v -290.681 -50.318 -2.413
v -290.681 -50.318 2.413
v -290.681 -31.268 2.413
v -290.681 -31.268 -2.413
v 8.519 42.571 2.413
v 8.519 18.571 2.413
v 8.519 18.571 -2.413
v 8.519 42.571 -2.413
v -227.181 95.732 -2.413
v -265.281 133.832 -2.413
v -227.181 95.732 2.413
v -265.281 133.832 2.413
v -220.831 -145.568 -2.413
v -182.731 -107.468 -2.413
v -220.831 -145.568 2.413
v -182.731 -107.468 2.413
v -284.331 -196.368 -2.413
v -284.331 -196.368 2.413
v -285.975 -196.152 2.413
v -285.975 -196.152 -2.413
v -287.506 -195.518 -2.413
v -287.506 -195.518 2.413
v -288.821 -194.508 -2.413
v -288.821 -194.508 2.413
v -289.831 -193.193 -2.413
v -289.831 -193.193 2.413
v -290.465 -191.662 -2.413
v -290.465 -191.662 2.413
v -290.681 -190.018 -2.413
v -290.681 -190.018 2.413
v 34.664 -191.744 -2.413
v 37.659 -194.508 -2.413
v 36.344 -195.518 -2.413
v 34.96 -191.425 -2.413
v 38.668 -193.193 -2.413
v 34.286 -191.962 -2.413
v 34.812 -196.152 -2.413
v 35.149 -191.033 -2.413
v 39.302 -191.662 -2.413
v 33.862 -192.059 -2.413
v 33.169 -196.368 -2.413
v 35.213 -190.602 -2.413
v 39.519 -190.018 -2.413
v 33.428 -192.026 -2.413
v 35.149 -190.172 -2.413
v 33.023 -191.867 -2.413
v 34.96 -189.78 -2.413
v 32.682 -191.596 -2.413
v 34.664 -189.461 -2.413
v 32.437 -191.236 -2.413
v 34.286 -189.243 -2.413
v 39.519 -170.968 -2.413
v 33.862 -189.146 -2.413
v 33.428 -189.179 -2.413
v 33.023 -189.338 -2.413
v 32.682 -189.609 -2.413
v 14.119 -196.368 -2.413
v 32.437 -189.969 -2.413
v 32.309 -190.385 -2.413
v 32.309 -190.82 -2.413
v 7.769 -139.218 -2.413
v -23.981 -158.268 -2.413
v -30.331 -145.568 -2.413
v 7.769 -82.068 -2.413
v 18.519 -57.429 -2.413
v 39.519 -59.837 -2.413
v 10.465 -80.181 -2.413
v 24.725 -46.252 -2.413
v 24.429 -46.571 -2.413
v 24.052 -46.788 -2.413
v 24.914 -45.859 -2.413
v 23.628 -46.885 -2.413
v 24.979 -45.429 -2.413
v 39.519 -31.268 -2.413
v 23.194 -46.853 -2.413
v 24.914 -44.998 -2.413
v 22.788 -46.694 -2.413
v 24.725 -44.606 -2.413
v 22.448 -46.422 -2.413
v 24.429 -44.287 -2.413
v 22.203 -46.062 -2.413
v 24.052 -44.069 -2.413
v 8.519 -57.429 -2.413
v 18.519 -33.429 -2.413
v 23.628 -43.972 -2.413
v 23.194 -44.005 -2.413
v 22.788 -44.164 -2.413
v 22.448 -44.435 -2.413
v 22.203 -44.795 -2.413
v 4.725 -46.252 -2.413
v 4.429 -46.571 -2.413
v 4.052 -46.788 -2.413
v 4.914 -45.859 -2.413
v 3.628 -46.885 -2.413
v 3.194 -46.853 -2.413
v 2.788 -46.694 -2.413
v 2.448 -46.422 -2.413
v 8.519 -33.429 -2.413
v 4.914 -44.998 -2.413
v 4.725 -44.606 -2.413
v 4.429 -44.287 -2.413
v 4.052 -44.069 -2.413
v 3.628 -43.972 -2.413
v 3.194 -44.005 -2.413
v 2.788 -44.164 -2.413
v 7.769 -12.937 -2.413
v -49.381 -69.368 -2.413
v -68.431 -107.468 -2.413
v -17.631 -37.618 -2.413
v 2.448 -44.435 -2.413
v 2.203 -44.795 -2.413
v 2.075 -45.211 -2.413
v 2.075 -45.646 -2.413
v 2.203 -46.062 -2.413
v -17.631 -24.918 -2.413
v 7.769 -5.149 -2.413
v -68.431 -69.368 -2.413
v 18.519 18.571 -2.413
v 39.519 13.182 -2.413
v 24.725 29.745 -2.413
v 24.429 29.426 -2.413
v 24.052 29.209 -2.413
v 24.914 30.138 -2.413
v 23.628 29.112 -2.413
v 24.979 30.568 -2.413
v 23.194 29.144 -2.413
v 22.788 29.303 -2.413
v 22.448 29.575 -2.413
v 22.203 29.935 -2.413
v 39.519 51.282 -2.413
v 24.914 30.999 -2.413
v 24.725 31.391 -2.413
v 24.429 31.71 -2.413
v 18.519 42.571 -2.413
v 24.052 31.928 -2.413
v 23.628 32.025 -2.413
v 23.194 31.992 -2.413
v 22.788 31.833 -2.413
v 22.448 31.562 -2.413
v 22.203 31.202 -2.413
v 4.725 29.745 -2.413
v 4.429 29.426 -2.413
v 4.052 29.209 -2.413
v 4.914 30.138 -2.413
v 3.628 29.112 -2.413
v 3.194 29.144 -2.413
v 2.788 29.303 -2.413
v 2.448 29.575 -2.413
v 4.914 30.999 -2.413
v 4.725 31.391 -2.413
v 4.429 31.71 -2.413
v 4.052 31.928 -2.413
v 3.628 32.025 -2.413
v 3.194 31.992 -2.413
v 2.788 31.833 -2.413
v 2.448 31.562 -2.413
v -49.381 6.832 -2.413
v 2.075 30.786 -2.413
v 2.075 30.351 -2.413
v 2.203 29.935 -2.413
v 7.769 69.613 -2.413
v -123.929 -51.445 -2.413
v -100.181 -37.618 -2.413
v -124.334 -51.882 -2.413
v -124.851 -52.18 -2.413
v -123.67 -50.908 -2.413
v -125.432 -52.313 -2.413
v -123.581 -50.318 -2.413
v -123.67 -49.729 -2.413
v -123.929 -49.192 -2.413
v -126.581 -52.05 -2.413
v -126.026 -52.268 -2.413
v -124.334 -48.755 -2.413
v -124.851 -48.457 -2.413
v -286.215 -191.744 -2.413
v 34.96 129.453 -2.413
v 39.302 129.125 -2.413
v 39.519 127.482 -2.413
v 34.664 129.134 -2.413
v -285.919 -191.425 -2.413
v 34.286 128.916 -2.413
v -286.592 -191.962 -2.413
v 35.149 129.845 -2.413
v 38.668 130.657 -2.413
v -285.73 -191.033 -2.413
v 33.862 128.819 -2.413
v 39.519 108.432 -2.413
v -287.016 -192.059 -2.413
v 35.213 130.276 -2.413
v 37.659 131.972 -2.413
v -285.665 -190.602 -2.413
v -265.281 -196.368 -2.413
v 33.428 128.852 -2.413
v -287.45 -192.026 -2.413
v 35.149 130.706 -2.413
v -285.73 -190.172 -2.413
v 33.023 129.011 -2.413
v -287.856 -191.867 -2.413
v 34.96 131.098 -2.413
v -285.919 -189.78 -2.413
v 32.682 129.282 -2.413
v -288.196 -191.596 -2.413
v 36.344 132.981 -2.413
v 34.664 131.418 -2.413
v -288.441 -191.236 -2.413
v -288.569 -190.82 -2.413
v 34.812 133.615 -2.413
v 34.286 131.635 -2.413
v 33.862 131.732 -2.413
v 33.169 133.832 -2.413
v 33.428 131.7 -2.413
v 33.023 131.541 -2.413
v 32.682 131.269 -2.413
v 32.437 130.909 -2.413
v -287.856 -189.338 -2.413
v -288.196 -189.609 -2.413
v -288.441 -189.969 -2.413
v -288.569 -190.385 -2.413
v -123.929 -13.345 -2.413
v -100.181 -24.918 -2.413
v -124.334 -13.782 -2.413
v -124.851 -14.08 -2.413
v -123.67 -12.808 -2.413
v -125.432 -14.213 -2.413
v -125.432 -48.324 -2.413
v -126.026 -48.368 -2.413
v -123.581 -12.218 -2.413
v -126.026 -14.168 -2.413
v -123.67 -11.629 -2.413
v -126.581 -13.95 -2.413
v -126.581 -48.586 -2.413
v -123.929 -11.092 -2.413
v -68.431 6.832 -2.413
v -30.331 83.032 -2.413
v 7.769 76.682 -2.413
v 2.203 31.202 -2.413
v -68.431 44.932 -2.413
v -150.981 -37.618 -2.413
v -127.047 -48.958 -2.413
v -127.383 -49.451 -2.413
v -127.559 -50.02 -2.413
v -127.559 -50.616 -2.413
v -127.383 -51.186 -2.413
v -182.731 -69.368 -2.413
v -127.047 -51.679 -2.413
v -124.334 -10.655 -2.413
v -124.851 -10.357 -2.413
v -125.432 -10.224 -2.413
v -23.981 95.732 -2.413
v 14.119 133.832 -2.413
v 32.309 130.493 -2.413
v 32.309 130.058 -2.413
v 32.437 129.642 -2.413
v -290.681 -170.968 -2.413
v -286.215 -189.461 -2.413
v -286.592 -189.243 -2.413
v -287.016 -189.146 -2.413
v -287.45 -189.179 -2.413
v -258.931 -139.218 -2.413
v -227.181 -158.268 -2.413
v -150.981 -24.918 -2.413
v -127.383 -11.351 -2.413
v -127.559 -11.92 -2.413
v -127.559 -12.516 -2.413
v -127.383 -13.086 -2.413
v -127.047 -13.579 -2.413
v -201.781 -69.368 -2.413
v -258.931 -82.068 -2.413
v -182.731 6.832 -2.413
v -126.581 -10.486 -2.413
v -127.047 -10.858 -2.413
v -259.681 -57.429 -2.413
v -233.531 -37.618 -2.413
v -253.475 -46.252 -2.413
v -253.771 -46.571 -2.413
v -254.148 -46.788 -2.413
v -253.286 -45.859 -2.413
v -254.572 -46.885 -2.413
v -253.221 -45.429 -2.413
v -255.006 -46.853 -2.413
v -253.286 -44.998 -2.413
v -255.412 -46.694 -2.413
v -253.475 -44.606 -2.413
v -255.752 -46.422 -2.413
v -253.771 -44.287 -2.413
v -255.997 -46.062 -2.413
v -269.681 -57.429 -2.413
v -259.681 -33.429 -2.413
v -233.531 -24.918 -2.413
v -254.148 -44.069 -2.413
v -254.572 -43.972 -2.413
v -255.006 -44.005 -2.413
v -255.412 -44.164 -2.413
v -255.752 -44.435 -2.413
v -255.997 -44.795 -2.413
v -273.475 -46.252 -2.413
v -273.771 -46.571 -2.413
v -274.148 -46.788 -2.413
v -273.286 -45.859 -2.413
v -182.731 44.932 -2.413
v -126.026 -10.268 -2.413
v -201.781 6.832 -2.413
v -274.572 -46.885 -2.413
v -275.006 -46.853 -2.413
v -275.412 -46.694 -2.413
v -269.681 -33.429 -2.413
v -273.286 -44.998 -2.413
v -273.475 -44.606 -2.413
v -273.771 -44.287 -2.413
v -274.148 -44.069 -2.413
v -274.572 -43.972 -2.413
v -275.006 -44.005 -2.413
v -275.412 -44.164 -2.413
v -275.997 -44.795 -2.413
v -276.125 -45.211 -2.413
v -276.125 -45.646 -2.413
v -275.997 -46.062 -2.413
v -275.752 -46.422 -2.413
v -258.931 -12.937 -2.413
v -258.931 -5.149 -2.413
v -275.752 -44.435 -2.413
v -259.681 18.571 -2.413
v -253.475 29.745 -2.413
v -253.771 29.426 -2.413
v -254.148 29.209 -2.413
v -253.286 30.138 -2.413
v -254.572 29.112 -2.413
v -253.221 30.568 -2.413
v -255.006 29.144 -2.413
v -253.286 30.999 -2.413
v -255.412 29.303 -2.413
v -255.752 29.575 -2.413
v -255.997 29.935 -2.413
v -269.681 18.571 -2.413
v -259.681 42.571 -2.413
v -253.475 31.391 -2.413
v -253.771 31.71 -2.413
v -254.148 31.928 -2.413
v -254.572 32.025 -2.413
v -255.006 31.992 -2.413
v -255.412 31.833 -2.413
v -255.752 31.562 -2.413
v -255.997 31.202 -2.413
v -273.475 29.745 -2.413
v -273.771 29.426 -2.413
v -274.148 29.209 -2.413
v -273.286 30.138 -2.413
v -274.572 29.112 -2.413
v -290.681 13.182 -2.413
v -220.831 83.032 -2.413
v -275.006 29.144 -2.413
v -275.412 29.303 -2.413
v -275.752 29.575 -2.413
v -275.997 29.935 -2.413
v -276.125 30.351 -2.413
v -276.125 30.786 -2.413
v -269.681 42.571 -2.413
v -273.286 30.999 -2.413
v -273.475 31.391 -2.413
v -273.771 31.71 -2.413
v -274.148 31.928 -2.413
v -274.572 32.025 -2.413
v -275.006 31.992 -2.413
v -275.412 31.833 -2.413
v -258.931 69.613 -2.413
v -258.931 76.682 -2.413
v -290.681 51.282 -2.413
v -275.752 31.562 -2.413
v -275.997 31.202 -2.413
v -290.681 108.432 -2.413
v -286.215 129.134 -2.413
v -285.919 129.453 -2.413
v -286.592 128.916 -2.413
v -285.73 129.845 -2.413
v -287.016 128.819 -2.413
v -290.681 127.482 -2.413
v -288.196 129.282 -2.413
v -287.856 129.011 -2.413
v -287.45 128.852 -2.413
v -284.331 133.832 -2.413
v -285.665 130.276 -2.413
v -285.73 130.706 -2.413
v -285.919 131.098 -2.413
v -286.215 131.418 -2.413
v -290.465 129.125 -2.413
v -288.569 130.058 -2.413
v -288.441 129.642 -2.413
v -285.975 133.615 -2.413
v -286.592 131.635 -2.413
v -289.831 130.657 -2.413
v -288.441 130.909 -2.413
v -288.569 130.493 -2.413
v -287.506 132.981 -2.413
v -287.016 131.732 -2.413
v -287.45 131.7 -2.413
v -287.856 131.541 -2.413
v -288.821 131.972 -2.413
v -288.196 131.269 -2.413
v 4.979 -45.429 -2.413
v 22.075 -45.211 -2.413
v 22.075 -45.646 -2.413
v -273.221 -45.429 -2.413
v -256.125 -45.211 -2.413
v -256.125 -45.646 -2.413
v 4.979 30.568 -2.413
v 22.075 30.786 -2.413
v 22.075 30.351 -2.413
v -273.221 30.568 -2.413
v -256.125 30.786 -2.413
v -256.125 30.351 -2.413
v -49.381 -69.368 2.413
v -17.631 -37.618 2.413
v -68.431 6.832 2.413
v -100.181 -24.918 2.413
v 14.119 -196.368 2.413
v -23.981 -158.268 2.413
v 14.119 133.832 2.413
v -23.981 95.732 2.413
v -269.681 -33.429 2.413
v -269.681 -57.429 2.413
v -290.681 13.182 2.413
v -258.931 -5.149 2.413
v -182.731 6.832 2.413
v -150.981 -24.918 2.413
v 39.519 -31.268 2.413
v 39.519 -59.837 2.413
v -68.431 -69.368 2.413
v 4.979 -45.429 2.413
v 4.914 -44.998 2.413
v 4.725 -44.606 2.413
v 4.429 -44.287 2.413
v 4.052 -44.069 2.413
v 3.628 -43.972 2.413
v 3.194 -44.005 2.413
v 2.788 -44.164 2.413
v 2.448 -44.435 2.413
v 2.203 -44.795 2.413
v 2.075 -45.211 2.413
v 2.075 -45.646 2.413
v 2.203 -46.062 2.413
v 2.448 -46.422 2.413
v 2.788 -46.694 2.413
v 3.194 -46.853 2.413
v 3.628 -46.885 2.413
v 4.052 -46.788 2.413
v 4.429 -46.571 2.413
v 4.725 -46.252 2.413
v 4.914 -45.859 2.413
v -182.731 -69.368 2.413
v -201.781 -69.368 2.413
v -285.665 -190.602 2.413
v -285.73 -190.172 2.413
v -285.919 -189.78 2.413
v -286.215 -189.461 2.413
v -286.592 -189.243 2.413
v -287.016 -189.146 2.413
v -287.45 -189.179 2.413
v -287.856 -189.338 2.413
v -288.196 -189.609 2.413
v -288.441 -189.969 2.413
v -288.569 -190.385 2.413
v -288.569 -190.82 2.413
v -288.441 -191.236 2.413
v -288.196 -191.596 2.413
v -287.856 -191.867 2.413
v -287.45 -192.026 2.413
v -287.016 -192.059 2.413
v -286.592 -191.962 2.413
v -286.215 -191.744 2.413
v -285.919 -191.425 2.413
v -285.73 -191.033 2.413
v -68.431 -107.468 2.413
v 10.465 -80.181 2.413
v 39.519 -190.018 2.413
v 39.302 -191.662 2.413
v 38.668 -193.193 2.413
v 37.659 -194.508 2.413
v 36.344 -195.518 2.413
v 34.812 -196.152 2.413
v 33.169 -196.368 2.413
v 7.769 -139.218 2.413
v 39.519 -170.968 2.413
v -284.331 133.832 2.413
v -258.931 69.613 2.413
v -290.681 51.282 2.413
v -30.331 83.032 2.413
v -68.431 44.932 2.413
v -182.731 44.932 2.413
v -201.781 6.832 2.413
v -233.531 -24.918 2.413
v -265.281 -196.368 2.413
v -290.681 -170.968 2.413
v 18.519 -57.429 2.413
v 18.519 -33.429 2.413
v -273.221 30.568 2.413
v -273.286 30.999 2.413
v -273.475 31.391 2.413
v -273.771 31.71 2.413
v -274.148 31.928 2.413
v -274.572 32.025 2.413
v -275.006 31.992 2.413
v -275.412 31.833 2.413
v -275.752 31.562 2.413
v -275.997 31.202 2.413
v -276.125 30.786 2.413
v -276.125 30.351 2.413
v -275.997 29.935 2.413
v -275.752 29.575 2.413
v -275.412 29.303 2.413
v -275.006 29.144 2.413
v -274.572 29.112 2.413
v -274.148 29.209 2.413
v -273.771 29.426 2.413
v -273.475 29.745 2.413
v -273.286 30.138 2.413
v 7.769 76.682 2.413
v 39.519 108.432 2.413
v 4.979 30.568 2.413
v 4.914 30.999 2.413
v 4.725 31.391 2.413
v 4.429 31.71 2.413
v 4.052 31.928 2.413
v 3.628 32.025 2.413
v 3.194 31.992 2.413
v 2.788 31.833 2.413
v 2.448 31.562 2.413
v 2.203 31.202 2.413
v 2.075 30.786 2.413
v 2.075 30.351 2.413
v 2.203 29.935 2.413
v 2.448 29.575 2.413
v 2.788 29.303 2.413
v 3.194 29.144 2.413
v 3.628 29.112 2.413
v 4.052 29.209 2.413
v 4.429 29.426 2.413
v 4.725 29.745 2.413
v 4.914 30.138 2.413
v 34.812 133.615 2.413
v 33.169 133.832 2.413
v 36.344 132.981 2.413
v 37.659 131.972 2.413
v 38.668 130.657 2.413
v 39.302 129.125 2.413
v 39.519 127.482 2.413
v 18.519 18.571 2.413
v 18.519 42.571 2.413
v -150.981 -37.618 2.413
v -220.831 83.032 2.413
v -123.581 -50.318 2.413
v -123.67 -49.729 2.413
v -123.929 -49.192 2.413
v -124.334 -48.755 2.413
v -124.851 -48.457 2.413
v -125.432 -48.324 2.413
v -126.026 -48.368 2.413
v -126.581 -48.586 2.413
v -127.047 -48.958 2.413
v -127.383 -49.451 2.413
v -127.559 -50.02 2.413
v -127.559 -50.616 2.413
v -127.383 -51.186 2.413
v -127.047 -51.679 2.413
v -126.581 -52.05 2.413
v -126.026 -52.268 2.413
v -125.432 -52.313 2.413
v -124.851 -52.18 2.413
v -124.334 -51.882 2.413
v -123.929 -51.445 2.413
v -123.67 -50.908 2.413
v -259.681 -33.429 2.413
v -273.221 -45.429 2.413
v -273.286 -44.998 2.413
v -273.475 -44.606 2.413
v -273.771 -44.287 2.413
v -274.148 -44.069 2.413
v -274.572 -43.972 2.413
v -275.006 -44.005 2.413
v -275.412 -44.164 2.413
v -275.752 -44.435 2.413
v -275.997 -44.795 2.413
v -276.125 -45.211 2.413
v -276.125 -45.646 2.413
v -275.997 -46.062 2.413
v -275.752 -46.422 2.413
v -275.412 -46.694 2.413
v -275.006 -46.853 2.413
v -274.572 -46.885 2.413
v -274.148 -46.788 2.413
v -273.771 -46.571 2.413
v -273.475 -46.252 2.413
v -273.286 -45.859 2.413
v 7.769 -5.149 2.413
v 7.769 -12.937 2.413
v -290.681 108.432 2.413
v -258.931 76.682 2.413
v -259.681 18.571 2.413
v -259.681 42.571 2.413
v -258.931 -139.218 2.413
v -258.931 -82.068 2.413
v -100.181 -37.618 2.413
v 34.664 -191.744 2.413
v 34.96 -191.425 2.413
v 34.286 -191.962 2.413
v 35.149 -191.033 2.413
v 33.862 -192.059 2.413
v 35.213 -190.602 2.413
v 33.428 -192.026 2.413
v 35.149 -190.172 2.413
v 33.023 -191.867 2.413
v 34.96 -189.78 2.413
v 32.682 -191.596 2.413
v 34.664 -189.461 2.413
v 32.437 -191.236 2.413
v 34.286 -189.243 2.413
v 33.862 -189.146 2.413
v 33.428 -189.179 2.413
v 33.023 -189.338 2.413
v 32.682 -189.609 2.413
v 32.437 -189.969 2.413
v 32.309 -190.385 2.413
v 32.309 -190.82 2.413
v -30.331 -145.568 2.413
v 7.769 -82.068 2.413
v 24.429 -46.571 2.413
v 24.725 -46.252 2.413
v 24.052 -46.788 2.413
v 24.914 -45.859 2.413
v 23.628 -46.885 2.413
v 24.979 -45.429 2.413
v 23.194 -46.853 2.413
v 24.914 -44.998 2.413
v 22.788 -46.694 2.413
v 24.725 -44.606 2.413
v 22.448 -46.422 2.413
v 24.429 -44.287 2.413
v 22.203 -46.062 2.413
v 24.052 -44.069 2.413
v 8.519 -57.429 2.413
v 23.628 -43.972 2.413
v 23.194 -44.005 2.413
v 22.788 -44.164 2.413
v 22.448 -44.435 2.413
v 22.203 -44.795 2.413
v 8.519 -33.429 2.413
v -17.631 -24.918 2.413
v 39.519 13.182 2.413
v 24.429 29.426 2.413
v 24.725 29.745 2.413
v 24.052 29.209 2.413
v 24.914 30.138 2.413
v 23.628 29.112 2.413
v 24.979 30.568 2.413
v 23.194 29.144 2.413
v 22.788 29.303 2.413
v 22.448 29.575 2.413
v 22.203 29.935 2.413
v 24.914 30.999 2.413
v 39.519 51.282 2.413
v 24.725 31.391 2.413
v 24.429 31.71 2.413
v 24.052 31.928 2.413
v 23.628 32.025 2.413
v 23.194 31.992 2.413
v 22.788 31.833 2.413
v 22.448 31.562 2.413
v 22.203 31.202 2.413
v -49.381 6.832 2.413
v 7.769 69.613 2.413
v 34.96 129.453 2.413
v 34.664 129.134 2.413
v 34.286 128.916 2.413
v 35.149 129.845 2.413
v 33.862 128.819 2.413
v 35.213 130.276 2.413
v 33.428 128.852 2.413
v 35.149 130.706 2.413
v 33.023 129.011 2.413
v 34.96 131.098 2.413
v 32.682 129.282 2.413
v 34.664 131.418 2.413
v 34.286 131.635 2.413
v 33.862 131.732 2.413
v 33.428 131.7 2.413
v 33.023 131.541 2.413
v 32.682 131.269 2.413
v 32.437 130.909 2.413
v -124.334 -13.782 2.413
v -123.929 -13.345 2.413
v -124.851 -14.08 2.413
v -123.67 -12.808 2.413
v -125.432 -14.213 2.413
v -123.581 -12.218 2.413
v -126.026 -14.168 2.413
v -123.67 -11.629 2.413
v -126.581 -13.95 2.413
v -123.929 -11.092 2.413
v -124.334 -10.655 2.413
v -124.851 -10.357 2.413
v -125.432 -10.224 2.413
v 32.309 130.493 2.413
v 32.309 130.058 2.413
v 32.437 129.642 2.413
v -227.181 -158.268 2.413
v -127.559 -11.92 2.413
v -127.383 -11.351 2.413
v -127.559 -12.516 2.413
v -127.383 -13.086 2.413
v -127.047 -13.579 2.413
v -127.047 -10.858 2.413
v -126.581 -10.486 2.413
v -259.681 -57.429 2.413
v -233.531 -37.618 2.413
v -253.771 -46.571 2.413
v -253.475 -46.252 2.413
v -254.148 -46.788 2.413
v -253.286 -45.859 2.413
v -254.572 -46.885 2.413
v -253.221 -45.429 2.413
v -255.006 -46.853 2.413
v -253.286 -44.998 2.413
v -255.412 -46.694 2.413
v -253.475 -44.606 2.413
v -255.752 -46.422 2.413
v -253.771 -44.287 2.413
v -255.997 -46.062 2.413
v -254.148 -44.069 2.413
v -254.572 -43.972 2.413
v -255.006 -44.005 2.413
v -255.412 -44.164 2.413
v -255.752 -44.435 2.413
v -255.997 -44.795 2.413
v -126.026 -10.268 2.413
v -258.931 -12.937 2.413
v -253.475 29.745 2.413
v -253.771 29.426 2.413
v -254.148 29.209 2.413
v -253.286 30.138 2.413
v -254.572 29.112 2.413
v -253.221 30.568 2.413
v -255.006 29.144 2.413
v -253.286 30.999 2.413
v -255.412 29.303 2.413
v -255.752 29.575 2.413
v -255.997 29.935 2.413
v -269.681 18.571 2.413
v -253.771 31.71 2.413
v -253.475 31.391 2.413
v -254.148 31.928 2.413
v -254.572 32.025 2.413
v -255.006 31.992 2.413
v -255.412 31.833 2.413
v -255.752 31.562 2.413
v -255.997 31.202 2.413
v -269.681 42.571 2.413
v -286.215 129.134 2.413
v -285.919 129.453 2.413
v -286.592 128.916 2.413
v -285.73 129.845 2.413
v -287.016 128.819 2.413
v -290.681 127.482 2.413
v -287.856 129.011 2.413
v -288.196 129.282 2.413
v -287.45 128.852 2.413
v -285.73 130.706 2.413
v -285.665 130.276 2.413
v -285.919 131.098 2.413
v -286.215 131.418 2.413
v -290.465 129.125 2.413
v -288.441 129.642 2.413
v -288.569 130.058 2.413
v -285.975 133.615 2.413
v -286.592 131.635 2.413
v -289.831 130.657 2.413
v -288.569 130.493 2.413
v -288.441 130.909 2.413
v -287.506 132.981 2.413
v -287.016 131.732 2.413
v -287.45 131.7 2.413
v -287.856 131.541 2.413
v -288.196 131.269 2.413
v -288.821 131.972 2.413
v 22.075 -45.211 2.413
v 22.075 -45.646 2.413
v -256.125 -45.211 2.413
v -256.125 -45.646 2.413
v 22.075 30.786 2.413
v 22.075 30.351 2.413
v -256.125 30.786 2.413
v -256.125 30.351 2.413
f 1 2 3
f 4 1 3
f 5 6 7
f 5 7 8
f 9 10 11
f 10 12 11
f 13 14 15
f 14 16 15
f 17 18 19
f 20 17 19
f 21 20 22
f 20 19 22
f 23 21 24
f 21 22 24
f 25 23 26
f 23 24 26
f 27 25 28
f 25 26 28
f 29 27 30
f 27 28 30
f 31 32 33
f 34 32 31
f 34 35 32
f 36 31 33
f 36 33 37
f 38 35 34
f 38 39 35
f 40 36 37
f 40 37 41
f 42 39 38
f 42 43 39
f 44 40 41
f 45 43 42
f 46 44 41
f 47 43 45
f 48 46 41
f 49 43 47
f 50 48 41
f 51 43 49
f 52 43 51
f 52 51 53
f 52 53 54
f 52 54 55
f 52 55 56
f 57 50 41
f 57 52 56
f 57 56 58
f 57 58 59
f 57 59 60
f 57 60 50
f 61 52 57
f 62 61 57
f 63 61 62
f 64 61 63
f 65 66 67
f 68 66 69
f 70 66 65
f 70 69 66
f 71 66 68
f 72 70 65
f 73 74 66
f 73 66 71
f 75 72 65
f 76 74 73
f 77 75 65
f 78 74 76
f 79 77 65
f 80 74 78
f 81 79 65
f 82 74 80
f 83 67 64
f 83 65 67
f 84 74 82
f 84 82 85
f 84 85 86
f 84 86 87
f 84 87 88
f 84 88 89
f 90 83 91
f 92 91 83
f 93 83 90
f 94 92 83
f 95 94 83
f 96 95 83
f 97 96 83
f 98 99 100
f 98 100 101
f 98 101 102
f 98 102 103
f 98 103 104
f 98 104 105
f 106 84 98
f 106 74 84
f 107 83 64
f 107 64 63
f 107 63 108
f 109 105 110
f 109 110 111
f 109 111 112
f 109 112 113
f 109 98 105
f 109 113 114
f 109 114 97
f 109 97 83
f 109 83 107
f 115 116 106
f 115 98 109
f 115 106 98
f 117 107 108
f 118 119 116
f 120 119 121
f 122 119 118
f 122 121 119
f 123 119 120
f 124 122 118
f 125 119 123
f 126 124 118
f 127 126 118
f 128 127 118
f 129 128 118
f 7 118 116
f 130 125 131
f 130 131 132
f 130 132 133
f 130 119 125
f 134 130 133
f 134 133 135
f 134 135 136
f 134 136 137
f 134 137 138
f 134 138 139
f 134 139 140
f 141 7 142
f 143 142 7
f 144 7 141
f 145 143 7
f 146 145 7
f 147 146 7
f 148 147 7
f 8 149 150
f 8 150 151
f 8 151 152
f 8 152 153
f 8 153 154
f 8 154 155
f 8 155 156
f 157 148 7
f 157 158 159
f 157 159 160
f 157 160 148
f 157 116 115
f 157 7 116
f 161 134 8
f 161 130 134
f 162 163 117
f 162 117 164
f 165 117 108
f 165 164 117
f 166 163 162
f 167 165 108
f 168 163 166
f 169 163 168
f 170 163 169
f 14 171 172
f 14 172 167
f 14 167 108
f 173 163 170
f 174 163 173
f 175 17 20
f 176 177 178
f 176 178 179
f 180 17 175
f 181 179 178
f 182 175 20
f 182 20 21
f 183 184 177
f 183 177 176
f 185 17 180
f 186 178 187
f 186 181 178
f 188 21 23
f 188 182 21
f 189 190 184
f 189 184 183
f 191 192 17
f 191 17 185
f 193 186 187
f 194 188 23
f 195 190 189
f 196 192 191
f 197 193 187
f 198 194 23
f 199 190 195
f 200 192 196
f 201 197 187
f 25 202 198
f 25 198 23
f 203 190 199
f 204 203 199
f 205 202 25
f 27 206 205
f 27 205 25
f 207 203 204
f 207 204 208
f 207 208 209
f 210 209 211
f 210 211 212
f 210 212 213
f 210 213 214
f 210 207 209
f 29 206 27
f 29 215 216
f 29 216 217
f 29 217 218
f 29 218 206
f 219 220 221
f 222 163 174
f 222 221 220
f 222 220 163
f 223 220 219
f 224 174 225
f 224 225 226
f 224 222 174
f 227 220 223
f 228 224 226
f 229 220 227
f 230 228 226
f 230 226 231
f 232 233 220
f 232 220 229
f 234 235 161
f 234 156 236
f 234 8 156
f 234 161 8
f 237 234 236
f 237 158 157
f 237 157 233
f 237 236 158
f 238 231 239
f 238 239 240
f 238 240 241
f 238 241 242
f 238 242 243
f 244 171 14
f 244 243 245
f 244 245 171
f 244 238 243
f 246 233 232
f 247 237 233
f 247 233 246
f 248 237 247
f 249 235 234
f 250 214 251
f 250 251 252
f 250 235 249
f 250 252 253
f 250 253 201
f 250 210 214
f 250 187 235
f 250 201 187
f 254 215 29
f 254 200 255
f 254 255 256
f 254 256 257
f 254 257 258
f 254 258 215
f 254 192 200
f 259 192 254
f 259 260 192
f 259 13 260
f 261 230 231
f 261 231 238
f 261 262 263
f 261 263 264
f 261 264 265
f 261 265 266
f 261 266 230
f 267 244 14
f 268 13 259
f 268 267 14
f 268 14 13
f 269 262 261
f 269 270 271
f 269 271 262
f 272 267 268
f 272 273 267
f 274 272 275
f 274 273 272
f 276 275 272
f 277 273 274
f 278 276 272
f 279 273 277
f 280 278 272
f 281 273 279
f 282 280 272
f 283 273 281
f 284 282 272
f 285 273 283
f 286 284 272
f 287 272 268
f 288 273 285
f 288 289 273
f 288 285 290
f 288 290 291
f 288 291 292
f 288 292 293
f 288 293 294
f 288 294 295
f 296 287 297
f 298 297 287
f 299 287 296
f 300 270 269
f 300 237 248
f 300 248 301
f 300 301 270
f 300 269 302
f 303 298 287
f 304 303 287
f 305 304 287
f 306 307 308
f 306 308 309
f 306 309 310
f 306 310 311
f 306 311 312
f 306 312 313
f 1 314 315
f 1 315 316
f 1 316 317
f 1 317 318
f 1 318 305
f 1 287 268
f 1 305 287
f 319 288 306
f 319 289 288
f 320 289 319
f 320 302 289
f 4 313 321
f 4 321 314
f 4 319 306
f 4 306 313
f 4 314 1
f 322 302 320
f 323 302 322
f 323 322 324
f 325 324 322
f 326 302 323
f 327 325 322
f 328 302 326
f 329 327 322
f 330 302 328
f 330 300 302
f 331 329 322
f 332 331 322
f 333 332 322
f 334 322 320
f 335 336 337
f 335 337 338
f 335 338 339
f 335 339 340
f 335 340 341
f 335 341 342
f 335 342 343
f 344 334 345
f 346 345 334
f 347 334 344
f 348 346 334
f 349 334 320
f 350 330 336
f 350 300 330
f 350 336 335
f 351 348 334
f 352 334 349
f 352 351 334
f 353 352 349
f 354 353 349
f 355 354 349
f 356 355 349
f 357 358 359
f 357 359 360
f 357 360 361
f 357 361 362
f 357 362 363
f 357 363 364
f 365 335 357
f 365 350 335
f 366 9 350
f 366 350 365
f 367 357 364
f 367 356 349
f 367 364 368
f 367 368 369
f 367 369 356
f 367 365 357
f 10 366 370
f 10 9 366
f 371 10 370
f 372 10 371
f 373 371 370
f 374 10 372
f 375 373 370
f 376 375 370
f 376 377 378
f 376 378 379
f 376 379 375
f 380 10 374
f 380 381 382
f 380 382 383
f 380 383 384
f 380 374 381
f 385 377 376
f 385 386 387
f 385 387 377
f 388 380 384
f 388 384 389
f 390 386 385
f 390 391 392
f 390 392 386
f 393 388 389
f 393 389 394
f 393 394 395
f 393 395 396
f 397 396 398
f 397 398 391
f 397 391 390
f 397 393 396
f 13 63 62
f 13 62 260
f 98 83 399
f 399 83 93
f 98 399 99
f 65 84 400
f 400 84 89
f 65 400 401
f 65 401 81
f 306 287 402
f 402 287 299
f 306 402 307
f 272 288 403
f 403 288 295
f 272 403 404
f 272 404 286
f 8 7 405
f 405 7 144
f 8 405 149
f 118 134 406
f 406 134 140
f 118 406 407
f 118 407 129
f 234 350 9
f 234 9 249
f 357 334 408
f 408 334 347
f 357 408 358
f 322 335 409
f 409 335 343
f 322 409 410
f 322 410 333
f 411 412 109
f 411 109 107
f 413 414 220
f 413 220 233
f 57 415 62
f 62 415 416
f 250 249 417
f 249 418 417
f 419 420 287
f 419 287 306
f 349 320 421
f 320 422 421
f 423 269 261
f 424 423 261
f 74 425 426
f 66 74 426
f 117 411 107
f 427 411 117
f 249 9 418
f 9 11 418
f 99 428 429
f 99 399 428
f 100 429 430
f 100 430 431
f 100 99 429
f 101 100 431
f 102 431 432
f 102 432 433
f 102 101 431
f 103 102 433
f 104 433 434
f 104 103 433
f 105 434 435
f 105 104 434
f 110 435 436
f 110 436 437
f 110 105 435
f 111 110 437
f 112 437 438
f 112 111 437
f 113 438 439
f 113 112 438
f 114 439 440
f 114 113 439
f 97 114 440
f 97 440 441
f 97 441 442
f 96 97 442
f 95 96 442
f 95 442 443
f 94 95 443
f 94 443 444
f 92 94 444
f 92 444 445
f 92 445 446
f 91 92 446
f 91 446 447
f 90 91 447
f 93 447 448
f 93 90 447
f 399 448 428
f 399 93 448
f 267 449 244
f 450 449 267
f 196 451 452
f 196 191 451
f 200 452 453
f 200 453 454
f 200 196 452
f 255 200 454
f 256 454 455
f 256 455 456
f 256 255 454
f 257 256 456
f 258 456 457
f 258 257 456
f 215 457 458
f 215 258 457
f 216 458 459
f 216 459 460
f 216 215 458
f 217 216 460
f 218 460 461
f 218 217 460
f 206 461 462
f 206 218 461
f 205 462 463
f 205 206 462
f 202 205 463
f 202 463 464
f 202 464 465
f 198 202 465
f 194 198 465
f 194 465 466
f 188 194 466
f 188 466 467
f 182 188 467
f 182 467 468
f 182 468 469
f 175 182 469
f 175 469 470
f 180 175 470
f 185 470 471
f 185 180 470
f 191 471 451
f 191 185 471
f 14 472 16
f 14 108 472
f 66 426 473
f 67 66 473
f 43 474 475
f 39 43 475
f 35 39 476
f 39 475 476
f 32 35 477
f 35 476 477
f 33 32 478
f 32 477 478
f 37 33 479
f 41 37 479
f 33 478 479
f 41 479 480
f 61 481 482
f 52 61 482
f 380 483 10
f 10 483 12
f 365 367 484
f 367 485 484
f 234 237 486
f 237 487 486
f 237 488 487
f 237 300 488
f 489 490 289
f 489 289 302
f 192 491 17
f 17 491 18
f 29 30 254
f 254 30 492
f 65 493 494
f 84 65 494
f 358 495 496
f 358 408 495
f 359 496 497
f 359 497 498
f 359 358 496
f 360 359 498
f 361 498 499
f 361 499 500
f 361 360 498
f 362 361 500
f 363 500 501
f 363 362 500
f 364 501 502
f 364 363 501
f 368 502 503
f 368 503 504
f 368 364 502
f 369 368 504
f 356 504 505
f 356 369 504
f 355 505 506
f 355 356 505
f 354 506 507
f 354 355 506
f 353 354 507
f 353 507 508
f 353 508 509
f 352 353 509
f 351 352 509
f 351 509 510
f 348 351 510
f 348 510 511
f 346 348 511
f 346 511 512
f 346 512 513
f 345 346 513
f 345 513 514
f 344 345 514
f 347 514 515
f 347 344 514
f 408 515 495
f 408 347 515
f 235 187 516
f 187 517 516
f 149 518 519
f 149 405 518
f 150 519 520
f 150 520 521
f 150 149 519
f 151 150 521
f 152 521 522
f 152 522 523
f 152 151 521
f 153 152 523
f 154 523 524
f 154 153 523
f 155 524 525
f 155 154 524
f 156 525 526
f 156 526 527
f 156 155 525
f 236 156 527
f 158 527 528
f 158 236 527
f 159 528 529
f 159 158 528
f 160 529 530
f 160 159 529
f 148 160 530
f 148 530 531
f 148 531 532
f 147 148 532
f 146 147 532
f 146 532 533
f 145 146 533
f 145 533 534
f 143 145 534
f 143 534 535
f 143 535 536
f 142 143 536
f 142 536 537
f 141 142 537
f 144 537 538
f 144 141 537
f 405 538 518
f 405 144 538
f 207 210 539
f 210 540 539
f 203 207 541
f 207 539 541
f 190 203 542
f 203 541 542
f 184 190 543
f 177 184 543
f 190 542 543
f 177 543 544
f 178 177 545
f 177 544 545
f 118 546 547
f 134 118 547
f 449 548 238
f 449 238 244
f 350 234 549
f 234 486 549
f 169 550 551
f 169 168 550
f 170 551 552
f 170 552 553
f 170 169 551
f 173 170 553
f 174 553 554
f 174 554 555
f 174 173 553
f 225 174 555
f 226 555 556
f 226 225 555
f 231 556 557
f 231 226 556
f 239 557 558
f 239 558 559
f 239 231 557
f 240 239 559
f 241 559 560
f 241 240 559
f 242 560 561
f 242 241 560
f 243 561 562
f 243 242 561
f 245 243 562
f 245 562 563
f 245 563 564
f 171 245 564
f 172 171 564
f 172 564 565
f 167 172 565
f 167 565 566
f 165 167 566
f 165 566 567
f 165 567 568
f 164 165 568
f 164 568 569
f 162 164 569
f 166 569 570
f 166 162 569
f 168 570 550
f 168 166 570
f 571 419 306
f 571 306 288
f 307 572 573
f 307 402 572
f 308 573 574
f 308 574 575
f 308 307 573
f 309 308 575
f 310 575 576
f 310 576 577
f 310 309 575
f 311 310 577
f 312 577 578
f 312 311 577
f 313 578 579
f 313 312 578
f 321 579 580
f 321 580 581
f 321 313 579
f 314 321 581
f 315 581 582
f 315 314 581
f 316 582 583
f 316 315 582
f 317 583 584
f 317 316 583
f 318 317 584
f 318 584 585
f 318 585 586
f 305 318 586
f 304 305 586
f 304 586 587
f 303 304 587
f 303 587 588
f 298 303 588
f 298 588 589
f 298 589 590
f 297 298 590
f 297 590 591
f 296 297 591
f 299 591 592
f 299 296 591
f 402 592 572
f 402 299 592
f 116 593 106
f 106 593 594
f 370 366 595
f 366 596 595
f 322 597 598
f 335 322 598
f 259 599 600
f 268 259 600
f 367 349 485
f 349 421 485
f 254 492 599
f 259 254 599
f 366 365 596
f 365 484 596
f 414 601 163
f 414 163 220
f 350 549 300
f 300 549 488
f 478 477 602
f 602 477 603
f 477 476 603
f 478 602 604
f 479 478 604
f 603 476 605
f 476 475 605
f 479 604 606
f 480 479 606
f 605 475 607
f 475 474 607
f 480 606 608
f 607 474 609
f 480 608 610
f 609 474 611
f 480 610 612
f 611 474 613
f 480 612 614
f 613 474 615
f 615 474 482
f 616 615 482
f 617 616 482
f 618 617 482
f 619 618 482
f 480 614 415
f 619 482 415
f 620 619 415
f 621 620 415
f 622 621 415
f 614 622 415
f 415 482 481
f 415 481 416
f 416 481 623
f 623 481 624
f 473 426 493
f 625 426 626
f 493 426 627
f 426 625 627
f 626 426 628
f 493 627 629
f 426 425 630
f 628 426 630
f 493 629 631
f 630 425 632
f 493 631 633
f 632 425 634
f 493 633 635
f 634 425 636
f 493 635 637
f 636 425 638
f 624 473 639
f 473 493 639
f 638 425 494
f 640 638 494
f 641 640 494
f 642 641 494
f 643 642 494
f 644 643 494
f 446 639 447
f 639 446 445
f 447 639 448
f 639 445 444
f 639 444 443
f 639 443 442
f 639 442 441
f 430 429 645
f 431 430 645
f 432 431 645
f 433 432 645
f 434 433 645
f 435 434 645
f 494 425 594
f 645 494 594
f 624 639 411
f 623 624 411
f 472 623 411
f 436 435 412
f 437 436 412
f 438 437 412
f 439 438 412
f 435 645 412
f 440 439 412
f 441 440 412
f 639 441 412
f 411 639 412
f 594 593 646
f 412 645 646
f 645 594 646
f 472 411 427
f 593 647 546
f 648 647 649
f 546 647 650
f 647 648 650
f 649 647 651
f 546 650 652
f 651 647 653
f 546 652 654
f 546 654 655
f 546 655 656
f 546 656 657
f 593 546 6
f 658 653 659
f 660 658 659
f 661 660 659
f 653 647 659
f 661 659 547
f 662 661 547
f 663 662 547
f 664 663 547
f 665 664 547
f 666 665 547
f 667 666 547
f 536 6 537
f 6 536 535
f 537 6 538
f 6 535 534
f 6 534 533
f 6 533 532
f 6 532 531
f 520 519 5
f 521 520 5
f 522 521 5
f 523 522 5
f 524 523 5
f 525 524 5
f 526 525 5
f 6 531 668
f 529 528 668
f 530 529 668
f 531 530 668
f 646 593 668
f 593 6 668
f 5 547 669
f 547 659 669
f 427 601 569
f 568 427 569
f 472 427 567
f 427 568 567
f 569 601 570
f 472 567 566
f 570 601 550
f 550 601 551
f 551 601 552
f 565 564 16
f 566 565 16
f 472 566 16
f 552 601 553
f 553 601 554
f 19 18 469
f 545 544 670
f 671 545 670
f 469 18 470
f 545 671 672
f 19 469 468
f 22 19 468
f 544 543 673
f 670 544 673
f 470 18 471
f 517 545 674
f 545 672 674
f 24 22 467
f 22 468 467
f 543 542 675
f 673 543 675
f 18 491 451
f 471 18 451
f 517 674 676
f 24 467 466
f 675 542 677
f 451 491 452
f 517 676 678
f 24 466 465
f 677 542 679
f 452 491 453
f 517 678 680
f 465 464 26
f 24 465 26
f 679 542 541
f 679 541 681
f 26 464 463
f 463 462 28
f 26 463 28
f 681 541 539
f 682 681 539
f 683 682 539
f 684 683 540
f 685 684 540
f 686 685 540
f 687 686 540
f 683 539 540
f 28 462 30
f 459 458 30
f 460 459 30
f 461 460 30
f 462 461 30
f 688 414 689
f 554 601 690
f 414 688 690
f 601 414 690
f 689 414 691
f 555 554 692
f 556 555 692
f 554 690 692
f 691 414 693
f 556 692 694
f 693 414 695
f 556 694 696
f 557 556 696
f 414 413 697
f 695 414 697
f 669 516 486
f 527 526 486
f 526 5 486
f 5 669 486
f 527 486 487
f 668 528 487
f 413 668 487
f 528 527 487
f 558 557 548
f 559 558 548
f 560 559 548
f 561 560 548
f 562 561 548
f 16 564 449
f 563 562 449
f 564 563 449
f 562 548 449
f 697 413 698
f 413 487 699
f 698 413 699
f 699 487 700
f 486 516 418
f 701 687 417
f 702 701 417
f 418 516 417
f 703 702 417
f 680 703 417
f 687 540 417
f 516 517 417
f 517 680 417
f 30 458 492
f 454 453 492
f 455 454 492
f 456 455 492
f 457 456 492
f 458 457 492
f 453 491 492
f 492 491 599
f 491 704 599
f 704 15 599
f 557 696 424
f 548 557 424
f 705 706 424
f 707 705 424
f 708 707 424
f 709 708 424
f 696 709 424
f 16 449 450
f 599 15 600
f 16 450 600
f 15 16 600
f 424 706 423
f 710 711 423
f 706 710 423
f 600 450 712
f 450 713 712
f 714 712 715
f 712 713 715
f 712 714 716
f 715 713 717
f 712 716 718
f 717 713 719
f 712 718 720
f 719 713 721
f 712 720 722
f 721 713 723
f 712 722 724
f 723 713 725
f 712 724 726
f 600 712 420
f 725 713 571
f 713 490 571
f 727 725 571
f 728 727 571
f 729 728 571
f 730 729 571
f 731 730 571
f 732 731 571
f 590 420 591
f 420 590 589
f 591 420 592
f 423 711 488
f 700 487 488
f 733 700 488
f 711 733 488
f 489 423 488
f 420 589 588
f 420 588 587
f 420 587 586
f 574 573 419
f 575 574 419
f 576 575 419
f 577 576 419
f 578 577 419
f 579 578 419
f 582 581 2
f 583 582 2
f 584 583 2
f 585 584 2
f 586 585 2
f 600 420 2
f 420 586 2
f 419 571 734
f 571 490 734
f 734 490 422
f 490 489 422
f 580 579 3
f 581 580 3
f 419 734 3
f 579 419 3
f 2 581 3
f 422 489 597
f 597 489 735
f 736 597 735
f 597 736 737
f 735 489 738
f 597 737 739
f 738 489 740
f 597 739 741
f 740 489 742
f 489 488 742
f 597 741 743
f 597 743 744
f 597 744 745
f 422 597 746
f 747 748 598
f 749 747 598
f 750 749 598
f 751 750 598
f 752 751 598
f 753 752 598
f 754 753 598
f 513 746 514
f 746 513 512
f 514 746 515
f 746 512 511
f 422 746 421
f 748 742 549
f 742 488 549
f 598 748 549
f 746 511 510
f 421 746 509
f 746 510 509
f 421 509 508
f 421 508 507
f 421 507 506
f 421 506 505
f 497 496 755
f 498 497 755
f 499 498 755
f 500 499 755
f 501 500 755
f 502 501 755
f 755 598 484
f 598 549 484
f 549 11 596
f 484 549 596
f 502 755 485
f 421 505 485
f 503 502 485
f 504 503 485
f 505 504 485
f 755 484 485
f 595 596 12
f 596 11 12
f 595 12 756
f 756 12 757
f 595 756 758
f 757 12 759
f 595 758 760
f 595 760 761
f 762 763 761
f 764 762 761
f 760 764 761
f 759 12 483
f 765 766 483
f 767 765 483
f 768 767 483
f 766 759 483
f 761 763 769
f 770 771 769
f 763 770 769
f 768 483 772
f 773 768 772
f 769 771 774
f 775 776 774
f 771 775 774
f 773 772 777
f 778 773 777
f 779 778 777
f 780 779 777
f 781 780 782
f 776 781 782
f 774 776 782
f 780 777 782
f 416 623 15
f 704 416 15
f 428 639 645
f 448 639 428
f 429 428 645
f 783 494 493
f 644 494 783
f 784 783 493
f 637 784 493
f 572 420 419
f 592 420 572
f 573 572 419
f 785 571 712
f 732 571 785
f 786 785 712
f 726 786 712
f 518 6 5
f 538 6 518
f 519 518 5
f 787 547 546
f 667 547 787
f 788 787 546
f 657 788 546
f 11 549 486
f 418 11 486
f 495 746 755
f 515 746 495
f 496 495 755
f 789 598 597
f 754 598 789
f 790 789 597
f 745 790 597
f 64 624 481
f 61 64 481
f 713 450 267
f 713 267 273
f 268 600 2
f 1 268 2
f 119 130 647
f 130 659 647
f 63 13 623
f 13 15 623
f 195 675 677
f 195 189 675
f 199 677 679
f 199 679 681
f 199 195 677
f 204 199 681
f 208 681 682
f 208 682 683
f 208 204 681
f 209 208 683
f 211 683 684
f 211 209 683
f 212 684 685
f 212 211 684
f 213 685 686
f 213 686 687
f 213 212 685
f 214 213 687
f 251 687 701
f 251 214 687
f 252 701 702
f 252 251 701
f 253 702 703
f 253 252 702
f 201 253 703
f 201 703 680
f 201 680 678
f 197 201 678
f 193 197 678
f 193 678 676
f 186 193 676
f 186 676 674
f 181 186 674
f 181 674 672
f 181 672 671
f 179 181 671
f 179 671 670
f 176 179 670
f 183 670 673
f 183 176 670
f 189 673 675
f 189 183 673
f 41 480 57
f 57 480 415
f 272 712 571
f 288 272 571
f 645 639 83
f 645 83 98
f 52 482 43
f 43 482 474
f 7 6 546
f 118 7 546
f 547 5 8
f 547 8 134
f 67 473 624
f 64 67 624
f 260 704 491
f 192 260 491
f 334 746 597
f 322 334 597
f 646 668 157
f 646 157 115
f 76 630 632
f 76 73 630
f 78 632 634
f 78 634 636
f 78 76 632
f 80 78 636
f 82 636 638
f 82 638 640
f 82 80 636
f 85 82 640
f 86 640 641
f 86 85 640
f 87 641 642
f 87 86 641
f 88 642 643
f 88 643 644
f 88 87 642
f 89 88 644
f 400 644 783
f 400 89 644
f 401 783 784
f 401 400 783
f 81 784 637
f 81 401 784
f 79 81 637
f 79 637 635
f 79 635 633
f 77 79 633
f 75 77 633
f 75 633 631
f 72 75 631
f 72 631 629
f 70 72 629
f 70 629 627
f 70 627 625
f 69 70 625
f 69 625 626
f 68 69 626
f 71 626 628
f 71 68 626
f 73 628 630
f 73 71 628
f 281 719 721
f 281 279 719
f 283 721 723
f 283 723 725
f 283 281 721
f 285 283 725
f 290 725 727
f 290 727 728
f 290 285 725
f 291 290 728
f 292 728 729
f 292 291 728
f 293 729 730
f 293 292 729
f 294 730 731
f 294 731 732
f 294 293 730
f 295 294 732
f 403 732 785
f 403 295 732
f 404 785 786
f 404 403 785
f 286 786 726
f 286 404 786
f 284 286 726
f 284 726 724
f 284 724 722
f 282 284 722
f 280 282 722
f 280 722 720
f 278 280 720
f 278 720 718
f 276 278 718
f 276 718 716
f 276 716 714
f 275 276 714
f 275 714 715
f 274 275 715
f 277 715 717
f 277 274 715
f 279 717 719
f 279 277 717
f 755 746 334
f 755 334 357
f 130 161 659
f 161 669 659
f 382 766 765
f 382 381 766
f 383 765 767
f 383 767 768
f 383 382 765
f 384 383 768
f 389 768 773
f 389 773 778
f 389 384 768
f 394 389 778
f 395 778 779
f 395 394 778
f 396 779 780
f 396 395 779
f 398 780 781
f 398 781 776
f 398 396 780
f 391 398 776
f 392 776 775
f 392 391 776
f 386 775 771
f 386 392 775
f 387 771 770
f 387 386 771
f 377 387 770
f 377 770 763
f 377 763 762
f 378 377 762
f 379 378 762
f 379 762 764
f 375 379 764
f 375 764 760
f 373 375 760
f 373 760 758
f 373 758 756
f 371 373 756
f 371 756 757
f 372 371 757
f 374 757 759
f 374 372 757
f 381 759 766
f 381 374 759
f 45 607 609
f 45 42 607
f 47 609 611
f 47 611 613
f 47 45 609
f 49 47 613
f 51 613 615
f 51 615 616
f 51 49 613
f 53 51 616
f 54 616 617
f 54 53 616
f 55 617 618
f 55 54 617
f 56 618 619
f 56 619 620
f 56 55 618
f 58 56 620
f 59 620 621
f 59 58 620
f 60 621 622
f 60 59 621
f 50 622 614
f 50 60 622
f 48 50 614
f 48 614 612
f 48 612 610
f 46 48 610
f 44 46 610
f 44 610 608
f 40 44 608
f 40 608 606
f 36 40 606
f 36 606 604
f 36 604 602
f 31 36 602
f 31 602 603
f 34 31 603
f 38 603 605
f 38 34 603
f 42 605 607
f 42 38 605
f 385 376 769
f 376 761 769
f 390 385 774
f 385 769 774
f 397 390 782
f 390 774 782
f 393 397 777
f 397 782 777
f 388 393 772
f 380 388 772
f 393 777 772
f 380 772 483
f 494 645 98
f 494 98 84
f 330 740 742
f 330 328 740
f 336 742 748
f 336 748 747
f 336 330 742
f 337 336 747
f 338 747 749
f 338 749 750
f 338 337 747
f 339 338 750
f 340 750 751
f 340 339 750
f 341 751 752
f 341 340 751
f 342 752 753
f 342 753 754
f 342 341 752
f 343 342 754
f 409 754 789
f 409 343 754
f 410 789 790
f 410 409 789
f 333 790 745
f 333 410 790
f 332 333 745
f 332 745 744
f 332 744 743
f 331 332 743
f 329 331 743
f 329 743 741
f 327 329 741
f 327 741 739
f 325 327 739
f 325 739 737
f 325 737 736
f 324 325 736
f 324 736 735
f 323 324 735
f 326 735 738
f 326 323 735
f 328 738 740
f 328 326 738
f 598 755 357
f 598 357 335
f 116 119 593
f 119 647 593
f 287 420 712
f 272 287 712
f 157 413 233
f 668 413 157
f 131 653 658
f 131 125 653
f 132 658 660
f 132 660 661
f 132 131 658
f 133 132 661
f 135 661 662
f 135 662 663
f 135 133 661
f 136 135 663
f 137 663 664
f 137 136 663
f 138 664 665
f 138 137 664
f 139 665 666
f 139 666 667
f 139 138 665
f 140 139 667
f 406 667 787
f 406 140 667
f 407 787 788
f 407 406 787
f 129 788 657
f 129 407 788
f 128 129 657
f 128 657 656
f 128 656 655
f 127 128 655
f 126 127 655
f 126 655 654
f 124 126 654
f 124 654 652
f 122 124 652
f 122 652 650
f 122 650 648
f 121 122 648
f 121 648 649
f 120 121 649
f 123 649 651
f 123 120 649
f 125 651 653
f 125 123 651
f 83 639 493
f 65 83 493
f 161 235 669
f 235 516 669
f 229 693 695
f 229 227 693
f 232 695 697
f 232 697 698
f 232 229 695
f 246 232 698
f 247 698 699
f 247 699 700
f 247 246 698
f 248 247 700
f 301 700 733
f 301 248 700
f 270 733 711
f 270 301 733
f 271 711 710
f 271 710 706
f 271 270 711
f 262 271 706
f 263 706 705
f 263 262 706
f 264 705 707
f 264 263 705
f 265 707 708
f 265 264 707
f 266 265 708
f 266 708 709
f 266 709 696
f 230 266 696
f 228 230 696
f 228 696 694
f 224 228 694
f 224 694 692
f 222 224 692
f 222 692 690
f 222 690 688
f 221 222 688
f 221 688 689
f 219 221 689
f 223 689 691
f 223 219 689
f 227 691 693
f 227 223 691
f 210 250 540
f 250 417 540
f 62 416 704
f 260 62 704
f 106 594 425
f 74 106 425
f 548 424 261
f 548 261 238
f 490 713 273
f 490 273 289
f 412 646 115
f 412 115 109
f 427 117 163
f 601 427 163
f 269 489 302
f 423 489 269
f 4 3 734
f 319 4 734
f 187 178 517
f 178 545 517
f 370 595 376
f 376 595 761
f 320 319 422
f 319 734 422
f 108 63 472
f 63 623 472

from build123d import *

# Parameters (mm, degrees)
MODEL_R             = 1.4605
MODEL_R_2           = 2
BOSS_EXTRUDE1_DEPTH = 2.413
SKETCH1_W           = 10
SKETCH1_H           = 24
CUT_EXTRUDE1_DEPTH  = 10


with BuildPart() as part:
    # Model → Boss-Extrude1 (new body, symmetric)
    with BuildSketch(Plane.XY):
        with BuildLine():
            Line((-290.681304326, -31.2683), (-258.931304326, -12.937428953))
            Line((-258.931304326, -12.937428953), (-258.931304326, -5.149171047))
            Line((-258.931304326, -5.149171047), (-290.681304326, 13.1817))
            Line((-290.681304326, 13.1817), (-290.681304326, 51.2817))
            Line((-290.681304326, 51.2817), (-258.931304326, 69.612571047))
            Line((-258.931304326, 69.612571047), (-258.931304326, 76.6817))
            Line((-258.931304326, 76.6817), (-290.681304326, 108.4317))
            Line((-290.681304326, 108.4317), (-290.681304326, 127.4817))
            ThreePointArc((-290.681304326, 127.4817), (-288.821432386, 131.971828061), (-284.331304326, 133.8317))
            Line((-284.331304326, 133.8317), (-265.281304326, 133.8317))
            Line((-265.281304326, 133.8317), (-227.181304326, 95.7317))
            Line((-227.181304326, 95.7317), (-23.981304326, 95.7317))
            Line((-23.981304326, 95.7317), (14.118695674, 133.8317))
            Line((14.118695674, 133.8317), (33.168695674, 133.8317))
            ThreePointArc((33.168695674, 133.8317), (37.658823735, 131.971828061), (39.518695674, 127.4817))
            Line((39.518695674, 127.4817), (39.518695674, 108.4317))
            Line((39.518695674, 108.4317), (7.768695674, 76.6817))
            Line((7.768695674, 76.6817), (7.768695674, 69.612571047))
            Line((7.768695674, 69.612571047), (39.518695674, 51.2817))
            Line((39.518695674, 51.2817), (39.518695674, 13.1817))
            Line((39.518695674, 13.1817), (7.768695674, -5.149171047))
            Line((7.768695674, -5.149171047), (7.768695674, -12.937428953))
            Line((7.768695674, -12.937428953), (39.518695674, -31.2683))
            Line((39.518695674, -31.2683), (39.518695674, -59.836710662))
            Line((39.518695674, -59.836710662), (10.464640386, -80.18057919))
            Line((10.464640386, -80.18057919), (7.768695674, -82.0683))
            Line((7.768695674, -82.0683), (7.768695674, -139.2183))
            Line((7.768695674, -139.2183), (39.518695674, -170.9683))
            Line((39.518695674, -170.9683), (39.518695674, -190.0183))
            ThreePointArc((39.518695674, -190.0183), (37.658823735, -194.508428061), (33.168695674, -196.3683))
            Line((33.168695674, -196.3683), (14.118695674, -196.3683))
            Line((14.118695674, -196.3683), (-23.981304326, -158.2683))
            Line((-23.981304326, -158.2683), (-227.181304326, -158.2683))
            Line((-227.181304326, -158.2683), (-265.281304326, -196.3683))
            Line((-265.281304326, -196.3683), (-284.331304326, -196.3683))
            ThreePointArc((-284.331304326, -196.3683), (-288.821432386, -194.508428061), (-290.681304326, -190.0183))
            Line((-290.681304326, -190.0183), (-290.681304326, -170.9683))
            Line((-290.681304326, -170.9683), (-258.931304326, -139.2183))
            Line((-258.931304326, -139.2183), (-258.931304326, -82.0683))
            Line((-258.931304326, -82.0683), (-290.681304326, -50.3183))
            Line((-290.681304326, -50.3183), (-290.681304326, -31.2683))
        make_face()
        with Locations((-287.125304326, -190.6025)):
            Circle(MODEL_R, mode=Mode.SUBTRACT)
        with Locations((33.752895674, -190.6025)):
            Circle(MODEL_R, mode=Mode.SUBTRACT)
        with Locations((33.752895674, 130.2757)):
            Circle(MODEL_R, mode=Mode.SUBTRACT)
        with Locations((-287.125304326, 130.2757)):
            Circle(MODEL_R, mode=Mode.SUBTRACT)
        with Locations((-274.681304256, -45.4288)):
            Circle(MODEL_R, mode=Mode.SUBTRACT)
        with Locations((-254.681304256, -45.4288)):
            Circle(MODEL_R, mode=Mode.SUBTRACT)
        with Locations((23.518695604, -45.4288)):
            Circle(MODEL_R, mode=Mode.SUBTRACT)
        with Locations((3.518695604, -45.4288)):
            Circle(MODEL_R, mode=Mode.SUBTRACT)
        with Locations((23.518695604, 30.5682)):
            Circle(MODEL_R, mode=Mode.SUBTRACT)
        with Locations((3.518695604, 30.5682)):
            Circle(MODEL_R, mode=Mode.SUBTRACT)
        with Locations((-254.681304256, 30.5682)):
            Circle(MODEL_R, mode=Mode.SUBTRACT)
        with Locations((-274.681304256, 30.5682)):
            Circle(MODEL_R, mode=Mode.SUBTRACT)
        with Locations((-125.581304326, -12.2183)):
            Circle(MODEL_R_2, mode=Mode.SUBTRACT)
        with Locations((-125.581304326, -50.3183)):
            Circle(MODEL_R_2, mode=Mode.SUBTRACT)
        Polygon((-30.331304326, -145.5683), (-68.431304326, -107.4683), (-182.731304326, -107.4683), (-220.831304326, -145.5683), align=None, mode=Mode.SUBTRACT)
        Polygon((-220.831304326, 83.0317), (-182.731304326, 44.9317), (-68.431304326, 44.9317), (-30.331304326, 83.0317), align=None, mode=Mode.SUBTRACT)
        Polygon((-201.781304326, -69.3683), (-233.531304326, -37.6183), (-233.531304326, -24.9183), (-201.781304326, 6.8317), (-182.731304326, 6.8317), (-150.981304326, -24.9183), (-150.981304326, -37.6183), (-182.731304326, -69.3683), align=None, mode=Mode.SUBTRACT)
        Polygon((-100.181304326, -37.6183), (-100.181304326, -24.9183), (-68.431304326, 6.8317), (-49.381304326, 6.8317), (-17.631304326, -24.9183), (-17.631304326, -37.6183), (-49.381304326, -69.3683), (-68.431304326, -69.3683), align=None, mode=Mode.SUBTRACT)
    extrude(amount=BOSS_EXTRUDE1_DEPTH, both=True)

    # Sketch1 → Cut-Extrude1 (cut)
    with BuildSketch(Plane.XY.offset(2.413)):
        with Locations((-264.681304256, -45.4288)):
            Rectangle(SKETCH1_W, SKETCH1_H)
        with Locations((-264.681304256, 30.5712)):
            Rectangle(SKETCH1_W, SKETCH1_H)
        with Locations((13.518695604, 30.5712)):
            Rectangle(SKETCH1_W, SKETCH1_H)
        with Locations((13.518695604, -45.4288)):
            Rectangle(SKETCH1_W, SKETCH1_H)
    extrude(amount=-CUT_EXTRUDE1_DEPTH, mode=Mode.SUBTRACT)


solid = part.part
